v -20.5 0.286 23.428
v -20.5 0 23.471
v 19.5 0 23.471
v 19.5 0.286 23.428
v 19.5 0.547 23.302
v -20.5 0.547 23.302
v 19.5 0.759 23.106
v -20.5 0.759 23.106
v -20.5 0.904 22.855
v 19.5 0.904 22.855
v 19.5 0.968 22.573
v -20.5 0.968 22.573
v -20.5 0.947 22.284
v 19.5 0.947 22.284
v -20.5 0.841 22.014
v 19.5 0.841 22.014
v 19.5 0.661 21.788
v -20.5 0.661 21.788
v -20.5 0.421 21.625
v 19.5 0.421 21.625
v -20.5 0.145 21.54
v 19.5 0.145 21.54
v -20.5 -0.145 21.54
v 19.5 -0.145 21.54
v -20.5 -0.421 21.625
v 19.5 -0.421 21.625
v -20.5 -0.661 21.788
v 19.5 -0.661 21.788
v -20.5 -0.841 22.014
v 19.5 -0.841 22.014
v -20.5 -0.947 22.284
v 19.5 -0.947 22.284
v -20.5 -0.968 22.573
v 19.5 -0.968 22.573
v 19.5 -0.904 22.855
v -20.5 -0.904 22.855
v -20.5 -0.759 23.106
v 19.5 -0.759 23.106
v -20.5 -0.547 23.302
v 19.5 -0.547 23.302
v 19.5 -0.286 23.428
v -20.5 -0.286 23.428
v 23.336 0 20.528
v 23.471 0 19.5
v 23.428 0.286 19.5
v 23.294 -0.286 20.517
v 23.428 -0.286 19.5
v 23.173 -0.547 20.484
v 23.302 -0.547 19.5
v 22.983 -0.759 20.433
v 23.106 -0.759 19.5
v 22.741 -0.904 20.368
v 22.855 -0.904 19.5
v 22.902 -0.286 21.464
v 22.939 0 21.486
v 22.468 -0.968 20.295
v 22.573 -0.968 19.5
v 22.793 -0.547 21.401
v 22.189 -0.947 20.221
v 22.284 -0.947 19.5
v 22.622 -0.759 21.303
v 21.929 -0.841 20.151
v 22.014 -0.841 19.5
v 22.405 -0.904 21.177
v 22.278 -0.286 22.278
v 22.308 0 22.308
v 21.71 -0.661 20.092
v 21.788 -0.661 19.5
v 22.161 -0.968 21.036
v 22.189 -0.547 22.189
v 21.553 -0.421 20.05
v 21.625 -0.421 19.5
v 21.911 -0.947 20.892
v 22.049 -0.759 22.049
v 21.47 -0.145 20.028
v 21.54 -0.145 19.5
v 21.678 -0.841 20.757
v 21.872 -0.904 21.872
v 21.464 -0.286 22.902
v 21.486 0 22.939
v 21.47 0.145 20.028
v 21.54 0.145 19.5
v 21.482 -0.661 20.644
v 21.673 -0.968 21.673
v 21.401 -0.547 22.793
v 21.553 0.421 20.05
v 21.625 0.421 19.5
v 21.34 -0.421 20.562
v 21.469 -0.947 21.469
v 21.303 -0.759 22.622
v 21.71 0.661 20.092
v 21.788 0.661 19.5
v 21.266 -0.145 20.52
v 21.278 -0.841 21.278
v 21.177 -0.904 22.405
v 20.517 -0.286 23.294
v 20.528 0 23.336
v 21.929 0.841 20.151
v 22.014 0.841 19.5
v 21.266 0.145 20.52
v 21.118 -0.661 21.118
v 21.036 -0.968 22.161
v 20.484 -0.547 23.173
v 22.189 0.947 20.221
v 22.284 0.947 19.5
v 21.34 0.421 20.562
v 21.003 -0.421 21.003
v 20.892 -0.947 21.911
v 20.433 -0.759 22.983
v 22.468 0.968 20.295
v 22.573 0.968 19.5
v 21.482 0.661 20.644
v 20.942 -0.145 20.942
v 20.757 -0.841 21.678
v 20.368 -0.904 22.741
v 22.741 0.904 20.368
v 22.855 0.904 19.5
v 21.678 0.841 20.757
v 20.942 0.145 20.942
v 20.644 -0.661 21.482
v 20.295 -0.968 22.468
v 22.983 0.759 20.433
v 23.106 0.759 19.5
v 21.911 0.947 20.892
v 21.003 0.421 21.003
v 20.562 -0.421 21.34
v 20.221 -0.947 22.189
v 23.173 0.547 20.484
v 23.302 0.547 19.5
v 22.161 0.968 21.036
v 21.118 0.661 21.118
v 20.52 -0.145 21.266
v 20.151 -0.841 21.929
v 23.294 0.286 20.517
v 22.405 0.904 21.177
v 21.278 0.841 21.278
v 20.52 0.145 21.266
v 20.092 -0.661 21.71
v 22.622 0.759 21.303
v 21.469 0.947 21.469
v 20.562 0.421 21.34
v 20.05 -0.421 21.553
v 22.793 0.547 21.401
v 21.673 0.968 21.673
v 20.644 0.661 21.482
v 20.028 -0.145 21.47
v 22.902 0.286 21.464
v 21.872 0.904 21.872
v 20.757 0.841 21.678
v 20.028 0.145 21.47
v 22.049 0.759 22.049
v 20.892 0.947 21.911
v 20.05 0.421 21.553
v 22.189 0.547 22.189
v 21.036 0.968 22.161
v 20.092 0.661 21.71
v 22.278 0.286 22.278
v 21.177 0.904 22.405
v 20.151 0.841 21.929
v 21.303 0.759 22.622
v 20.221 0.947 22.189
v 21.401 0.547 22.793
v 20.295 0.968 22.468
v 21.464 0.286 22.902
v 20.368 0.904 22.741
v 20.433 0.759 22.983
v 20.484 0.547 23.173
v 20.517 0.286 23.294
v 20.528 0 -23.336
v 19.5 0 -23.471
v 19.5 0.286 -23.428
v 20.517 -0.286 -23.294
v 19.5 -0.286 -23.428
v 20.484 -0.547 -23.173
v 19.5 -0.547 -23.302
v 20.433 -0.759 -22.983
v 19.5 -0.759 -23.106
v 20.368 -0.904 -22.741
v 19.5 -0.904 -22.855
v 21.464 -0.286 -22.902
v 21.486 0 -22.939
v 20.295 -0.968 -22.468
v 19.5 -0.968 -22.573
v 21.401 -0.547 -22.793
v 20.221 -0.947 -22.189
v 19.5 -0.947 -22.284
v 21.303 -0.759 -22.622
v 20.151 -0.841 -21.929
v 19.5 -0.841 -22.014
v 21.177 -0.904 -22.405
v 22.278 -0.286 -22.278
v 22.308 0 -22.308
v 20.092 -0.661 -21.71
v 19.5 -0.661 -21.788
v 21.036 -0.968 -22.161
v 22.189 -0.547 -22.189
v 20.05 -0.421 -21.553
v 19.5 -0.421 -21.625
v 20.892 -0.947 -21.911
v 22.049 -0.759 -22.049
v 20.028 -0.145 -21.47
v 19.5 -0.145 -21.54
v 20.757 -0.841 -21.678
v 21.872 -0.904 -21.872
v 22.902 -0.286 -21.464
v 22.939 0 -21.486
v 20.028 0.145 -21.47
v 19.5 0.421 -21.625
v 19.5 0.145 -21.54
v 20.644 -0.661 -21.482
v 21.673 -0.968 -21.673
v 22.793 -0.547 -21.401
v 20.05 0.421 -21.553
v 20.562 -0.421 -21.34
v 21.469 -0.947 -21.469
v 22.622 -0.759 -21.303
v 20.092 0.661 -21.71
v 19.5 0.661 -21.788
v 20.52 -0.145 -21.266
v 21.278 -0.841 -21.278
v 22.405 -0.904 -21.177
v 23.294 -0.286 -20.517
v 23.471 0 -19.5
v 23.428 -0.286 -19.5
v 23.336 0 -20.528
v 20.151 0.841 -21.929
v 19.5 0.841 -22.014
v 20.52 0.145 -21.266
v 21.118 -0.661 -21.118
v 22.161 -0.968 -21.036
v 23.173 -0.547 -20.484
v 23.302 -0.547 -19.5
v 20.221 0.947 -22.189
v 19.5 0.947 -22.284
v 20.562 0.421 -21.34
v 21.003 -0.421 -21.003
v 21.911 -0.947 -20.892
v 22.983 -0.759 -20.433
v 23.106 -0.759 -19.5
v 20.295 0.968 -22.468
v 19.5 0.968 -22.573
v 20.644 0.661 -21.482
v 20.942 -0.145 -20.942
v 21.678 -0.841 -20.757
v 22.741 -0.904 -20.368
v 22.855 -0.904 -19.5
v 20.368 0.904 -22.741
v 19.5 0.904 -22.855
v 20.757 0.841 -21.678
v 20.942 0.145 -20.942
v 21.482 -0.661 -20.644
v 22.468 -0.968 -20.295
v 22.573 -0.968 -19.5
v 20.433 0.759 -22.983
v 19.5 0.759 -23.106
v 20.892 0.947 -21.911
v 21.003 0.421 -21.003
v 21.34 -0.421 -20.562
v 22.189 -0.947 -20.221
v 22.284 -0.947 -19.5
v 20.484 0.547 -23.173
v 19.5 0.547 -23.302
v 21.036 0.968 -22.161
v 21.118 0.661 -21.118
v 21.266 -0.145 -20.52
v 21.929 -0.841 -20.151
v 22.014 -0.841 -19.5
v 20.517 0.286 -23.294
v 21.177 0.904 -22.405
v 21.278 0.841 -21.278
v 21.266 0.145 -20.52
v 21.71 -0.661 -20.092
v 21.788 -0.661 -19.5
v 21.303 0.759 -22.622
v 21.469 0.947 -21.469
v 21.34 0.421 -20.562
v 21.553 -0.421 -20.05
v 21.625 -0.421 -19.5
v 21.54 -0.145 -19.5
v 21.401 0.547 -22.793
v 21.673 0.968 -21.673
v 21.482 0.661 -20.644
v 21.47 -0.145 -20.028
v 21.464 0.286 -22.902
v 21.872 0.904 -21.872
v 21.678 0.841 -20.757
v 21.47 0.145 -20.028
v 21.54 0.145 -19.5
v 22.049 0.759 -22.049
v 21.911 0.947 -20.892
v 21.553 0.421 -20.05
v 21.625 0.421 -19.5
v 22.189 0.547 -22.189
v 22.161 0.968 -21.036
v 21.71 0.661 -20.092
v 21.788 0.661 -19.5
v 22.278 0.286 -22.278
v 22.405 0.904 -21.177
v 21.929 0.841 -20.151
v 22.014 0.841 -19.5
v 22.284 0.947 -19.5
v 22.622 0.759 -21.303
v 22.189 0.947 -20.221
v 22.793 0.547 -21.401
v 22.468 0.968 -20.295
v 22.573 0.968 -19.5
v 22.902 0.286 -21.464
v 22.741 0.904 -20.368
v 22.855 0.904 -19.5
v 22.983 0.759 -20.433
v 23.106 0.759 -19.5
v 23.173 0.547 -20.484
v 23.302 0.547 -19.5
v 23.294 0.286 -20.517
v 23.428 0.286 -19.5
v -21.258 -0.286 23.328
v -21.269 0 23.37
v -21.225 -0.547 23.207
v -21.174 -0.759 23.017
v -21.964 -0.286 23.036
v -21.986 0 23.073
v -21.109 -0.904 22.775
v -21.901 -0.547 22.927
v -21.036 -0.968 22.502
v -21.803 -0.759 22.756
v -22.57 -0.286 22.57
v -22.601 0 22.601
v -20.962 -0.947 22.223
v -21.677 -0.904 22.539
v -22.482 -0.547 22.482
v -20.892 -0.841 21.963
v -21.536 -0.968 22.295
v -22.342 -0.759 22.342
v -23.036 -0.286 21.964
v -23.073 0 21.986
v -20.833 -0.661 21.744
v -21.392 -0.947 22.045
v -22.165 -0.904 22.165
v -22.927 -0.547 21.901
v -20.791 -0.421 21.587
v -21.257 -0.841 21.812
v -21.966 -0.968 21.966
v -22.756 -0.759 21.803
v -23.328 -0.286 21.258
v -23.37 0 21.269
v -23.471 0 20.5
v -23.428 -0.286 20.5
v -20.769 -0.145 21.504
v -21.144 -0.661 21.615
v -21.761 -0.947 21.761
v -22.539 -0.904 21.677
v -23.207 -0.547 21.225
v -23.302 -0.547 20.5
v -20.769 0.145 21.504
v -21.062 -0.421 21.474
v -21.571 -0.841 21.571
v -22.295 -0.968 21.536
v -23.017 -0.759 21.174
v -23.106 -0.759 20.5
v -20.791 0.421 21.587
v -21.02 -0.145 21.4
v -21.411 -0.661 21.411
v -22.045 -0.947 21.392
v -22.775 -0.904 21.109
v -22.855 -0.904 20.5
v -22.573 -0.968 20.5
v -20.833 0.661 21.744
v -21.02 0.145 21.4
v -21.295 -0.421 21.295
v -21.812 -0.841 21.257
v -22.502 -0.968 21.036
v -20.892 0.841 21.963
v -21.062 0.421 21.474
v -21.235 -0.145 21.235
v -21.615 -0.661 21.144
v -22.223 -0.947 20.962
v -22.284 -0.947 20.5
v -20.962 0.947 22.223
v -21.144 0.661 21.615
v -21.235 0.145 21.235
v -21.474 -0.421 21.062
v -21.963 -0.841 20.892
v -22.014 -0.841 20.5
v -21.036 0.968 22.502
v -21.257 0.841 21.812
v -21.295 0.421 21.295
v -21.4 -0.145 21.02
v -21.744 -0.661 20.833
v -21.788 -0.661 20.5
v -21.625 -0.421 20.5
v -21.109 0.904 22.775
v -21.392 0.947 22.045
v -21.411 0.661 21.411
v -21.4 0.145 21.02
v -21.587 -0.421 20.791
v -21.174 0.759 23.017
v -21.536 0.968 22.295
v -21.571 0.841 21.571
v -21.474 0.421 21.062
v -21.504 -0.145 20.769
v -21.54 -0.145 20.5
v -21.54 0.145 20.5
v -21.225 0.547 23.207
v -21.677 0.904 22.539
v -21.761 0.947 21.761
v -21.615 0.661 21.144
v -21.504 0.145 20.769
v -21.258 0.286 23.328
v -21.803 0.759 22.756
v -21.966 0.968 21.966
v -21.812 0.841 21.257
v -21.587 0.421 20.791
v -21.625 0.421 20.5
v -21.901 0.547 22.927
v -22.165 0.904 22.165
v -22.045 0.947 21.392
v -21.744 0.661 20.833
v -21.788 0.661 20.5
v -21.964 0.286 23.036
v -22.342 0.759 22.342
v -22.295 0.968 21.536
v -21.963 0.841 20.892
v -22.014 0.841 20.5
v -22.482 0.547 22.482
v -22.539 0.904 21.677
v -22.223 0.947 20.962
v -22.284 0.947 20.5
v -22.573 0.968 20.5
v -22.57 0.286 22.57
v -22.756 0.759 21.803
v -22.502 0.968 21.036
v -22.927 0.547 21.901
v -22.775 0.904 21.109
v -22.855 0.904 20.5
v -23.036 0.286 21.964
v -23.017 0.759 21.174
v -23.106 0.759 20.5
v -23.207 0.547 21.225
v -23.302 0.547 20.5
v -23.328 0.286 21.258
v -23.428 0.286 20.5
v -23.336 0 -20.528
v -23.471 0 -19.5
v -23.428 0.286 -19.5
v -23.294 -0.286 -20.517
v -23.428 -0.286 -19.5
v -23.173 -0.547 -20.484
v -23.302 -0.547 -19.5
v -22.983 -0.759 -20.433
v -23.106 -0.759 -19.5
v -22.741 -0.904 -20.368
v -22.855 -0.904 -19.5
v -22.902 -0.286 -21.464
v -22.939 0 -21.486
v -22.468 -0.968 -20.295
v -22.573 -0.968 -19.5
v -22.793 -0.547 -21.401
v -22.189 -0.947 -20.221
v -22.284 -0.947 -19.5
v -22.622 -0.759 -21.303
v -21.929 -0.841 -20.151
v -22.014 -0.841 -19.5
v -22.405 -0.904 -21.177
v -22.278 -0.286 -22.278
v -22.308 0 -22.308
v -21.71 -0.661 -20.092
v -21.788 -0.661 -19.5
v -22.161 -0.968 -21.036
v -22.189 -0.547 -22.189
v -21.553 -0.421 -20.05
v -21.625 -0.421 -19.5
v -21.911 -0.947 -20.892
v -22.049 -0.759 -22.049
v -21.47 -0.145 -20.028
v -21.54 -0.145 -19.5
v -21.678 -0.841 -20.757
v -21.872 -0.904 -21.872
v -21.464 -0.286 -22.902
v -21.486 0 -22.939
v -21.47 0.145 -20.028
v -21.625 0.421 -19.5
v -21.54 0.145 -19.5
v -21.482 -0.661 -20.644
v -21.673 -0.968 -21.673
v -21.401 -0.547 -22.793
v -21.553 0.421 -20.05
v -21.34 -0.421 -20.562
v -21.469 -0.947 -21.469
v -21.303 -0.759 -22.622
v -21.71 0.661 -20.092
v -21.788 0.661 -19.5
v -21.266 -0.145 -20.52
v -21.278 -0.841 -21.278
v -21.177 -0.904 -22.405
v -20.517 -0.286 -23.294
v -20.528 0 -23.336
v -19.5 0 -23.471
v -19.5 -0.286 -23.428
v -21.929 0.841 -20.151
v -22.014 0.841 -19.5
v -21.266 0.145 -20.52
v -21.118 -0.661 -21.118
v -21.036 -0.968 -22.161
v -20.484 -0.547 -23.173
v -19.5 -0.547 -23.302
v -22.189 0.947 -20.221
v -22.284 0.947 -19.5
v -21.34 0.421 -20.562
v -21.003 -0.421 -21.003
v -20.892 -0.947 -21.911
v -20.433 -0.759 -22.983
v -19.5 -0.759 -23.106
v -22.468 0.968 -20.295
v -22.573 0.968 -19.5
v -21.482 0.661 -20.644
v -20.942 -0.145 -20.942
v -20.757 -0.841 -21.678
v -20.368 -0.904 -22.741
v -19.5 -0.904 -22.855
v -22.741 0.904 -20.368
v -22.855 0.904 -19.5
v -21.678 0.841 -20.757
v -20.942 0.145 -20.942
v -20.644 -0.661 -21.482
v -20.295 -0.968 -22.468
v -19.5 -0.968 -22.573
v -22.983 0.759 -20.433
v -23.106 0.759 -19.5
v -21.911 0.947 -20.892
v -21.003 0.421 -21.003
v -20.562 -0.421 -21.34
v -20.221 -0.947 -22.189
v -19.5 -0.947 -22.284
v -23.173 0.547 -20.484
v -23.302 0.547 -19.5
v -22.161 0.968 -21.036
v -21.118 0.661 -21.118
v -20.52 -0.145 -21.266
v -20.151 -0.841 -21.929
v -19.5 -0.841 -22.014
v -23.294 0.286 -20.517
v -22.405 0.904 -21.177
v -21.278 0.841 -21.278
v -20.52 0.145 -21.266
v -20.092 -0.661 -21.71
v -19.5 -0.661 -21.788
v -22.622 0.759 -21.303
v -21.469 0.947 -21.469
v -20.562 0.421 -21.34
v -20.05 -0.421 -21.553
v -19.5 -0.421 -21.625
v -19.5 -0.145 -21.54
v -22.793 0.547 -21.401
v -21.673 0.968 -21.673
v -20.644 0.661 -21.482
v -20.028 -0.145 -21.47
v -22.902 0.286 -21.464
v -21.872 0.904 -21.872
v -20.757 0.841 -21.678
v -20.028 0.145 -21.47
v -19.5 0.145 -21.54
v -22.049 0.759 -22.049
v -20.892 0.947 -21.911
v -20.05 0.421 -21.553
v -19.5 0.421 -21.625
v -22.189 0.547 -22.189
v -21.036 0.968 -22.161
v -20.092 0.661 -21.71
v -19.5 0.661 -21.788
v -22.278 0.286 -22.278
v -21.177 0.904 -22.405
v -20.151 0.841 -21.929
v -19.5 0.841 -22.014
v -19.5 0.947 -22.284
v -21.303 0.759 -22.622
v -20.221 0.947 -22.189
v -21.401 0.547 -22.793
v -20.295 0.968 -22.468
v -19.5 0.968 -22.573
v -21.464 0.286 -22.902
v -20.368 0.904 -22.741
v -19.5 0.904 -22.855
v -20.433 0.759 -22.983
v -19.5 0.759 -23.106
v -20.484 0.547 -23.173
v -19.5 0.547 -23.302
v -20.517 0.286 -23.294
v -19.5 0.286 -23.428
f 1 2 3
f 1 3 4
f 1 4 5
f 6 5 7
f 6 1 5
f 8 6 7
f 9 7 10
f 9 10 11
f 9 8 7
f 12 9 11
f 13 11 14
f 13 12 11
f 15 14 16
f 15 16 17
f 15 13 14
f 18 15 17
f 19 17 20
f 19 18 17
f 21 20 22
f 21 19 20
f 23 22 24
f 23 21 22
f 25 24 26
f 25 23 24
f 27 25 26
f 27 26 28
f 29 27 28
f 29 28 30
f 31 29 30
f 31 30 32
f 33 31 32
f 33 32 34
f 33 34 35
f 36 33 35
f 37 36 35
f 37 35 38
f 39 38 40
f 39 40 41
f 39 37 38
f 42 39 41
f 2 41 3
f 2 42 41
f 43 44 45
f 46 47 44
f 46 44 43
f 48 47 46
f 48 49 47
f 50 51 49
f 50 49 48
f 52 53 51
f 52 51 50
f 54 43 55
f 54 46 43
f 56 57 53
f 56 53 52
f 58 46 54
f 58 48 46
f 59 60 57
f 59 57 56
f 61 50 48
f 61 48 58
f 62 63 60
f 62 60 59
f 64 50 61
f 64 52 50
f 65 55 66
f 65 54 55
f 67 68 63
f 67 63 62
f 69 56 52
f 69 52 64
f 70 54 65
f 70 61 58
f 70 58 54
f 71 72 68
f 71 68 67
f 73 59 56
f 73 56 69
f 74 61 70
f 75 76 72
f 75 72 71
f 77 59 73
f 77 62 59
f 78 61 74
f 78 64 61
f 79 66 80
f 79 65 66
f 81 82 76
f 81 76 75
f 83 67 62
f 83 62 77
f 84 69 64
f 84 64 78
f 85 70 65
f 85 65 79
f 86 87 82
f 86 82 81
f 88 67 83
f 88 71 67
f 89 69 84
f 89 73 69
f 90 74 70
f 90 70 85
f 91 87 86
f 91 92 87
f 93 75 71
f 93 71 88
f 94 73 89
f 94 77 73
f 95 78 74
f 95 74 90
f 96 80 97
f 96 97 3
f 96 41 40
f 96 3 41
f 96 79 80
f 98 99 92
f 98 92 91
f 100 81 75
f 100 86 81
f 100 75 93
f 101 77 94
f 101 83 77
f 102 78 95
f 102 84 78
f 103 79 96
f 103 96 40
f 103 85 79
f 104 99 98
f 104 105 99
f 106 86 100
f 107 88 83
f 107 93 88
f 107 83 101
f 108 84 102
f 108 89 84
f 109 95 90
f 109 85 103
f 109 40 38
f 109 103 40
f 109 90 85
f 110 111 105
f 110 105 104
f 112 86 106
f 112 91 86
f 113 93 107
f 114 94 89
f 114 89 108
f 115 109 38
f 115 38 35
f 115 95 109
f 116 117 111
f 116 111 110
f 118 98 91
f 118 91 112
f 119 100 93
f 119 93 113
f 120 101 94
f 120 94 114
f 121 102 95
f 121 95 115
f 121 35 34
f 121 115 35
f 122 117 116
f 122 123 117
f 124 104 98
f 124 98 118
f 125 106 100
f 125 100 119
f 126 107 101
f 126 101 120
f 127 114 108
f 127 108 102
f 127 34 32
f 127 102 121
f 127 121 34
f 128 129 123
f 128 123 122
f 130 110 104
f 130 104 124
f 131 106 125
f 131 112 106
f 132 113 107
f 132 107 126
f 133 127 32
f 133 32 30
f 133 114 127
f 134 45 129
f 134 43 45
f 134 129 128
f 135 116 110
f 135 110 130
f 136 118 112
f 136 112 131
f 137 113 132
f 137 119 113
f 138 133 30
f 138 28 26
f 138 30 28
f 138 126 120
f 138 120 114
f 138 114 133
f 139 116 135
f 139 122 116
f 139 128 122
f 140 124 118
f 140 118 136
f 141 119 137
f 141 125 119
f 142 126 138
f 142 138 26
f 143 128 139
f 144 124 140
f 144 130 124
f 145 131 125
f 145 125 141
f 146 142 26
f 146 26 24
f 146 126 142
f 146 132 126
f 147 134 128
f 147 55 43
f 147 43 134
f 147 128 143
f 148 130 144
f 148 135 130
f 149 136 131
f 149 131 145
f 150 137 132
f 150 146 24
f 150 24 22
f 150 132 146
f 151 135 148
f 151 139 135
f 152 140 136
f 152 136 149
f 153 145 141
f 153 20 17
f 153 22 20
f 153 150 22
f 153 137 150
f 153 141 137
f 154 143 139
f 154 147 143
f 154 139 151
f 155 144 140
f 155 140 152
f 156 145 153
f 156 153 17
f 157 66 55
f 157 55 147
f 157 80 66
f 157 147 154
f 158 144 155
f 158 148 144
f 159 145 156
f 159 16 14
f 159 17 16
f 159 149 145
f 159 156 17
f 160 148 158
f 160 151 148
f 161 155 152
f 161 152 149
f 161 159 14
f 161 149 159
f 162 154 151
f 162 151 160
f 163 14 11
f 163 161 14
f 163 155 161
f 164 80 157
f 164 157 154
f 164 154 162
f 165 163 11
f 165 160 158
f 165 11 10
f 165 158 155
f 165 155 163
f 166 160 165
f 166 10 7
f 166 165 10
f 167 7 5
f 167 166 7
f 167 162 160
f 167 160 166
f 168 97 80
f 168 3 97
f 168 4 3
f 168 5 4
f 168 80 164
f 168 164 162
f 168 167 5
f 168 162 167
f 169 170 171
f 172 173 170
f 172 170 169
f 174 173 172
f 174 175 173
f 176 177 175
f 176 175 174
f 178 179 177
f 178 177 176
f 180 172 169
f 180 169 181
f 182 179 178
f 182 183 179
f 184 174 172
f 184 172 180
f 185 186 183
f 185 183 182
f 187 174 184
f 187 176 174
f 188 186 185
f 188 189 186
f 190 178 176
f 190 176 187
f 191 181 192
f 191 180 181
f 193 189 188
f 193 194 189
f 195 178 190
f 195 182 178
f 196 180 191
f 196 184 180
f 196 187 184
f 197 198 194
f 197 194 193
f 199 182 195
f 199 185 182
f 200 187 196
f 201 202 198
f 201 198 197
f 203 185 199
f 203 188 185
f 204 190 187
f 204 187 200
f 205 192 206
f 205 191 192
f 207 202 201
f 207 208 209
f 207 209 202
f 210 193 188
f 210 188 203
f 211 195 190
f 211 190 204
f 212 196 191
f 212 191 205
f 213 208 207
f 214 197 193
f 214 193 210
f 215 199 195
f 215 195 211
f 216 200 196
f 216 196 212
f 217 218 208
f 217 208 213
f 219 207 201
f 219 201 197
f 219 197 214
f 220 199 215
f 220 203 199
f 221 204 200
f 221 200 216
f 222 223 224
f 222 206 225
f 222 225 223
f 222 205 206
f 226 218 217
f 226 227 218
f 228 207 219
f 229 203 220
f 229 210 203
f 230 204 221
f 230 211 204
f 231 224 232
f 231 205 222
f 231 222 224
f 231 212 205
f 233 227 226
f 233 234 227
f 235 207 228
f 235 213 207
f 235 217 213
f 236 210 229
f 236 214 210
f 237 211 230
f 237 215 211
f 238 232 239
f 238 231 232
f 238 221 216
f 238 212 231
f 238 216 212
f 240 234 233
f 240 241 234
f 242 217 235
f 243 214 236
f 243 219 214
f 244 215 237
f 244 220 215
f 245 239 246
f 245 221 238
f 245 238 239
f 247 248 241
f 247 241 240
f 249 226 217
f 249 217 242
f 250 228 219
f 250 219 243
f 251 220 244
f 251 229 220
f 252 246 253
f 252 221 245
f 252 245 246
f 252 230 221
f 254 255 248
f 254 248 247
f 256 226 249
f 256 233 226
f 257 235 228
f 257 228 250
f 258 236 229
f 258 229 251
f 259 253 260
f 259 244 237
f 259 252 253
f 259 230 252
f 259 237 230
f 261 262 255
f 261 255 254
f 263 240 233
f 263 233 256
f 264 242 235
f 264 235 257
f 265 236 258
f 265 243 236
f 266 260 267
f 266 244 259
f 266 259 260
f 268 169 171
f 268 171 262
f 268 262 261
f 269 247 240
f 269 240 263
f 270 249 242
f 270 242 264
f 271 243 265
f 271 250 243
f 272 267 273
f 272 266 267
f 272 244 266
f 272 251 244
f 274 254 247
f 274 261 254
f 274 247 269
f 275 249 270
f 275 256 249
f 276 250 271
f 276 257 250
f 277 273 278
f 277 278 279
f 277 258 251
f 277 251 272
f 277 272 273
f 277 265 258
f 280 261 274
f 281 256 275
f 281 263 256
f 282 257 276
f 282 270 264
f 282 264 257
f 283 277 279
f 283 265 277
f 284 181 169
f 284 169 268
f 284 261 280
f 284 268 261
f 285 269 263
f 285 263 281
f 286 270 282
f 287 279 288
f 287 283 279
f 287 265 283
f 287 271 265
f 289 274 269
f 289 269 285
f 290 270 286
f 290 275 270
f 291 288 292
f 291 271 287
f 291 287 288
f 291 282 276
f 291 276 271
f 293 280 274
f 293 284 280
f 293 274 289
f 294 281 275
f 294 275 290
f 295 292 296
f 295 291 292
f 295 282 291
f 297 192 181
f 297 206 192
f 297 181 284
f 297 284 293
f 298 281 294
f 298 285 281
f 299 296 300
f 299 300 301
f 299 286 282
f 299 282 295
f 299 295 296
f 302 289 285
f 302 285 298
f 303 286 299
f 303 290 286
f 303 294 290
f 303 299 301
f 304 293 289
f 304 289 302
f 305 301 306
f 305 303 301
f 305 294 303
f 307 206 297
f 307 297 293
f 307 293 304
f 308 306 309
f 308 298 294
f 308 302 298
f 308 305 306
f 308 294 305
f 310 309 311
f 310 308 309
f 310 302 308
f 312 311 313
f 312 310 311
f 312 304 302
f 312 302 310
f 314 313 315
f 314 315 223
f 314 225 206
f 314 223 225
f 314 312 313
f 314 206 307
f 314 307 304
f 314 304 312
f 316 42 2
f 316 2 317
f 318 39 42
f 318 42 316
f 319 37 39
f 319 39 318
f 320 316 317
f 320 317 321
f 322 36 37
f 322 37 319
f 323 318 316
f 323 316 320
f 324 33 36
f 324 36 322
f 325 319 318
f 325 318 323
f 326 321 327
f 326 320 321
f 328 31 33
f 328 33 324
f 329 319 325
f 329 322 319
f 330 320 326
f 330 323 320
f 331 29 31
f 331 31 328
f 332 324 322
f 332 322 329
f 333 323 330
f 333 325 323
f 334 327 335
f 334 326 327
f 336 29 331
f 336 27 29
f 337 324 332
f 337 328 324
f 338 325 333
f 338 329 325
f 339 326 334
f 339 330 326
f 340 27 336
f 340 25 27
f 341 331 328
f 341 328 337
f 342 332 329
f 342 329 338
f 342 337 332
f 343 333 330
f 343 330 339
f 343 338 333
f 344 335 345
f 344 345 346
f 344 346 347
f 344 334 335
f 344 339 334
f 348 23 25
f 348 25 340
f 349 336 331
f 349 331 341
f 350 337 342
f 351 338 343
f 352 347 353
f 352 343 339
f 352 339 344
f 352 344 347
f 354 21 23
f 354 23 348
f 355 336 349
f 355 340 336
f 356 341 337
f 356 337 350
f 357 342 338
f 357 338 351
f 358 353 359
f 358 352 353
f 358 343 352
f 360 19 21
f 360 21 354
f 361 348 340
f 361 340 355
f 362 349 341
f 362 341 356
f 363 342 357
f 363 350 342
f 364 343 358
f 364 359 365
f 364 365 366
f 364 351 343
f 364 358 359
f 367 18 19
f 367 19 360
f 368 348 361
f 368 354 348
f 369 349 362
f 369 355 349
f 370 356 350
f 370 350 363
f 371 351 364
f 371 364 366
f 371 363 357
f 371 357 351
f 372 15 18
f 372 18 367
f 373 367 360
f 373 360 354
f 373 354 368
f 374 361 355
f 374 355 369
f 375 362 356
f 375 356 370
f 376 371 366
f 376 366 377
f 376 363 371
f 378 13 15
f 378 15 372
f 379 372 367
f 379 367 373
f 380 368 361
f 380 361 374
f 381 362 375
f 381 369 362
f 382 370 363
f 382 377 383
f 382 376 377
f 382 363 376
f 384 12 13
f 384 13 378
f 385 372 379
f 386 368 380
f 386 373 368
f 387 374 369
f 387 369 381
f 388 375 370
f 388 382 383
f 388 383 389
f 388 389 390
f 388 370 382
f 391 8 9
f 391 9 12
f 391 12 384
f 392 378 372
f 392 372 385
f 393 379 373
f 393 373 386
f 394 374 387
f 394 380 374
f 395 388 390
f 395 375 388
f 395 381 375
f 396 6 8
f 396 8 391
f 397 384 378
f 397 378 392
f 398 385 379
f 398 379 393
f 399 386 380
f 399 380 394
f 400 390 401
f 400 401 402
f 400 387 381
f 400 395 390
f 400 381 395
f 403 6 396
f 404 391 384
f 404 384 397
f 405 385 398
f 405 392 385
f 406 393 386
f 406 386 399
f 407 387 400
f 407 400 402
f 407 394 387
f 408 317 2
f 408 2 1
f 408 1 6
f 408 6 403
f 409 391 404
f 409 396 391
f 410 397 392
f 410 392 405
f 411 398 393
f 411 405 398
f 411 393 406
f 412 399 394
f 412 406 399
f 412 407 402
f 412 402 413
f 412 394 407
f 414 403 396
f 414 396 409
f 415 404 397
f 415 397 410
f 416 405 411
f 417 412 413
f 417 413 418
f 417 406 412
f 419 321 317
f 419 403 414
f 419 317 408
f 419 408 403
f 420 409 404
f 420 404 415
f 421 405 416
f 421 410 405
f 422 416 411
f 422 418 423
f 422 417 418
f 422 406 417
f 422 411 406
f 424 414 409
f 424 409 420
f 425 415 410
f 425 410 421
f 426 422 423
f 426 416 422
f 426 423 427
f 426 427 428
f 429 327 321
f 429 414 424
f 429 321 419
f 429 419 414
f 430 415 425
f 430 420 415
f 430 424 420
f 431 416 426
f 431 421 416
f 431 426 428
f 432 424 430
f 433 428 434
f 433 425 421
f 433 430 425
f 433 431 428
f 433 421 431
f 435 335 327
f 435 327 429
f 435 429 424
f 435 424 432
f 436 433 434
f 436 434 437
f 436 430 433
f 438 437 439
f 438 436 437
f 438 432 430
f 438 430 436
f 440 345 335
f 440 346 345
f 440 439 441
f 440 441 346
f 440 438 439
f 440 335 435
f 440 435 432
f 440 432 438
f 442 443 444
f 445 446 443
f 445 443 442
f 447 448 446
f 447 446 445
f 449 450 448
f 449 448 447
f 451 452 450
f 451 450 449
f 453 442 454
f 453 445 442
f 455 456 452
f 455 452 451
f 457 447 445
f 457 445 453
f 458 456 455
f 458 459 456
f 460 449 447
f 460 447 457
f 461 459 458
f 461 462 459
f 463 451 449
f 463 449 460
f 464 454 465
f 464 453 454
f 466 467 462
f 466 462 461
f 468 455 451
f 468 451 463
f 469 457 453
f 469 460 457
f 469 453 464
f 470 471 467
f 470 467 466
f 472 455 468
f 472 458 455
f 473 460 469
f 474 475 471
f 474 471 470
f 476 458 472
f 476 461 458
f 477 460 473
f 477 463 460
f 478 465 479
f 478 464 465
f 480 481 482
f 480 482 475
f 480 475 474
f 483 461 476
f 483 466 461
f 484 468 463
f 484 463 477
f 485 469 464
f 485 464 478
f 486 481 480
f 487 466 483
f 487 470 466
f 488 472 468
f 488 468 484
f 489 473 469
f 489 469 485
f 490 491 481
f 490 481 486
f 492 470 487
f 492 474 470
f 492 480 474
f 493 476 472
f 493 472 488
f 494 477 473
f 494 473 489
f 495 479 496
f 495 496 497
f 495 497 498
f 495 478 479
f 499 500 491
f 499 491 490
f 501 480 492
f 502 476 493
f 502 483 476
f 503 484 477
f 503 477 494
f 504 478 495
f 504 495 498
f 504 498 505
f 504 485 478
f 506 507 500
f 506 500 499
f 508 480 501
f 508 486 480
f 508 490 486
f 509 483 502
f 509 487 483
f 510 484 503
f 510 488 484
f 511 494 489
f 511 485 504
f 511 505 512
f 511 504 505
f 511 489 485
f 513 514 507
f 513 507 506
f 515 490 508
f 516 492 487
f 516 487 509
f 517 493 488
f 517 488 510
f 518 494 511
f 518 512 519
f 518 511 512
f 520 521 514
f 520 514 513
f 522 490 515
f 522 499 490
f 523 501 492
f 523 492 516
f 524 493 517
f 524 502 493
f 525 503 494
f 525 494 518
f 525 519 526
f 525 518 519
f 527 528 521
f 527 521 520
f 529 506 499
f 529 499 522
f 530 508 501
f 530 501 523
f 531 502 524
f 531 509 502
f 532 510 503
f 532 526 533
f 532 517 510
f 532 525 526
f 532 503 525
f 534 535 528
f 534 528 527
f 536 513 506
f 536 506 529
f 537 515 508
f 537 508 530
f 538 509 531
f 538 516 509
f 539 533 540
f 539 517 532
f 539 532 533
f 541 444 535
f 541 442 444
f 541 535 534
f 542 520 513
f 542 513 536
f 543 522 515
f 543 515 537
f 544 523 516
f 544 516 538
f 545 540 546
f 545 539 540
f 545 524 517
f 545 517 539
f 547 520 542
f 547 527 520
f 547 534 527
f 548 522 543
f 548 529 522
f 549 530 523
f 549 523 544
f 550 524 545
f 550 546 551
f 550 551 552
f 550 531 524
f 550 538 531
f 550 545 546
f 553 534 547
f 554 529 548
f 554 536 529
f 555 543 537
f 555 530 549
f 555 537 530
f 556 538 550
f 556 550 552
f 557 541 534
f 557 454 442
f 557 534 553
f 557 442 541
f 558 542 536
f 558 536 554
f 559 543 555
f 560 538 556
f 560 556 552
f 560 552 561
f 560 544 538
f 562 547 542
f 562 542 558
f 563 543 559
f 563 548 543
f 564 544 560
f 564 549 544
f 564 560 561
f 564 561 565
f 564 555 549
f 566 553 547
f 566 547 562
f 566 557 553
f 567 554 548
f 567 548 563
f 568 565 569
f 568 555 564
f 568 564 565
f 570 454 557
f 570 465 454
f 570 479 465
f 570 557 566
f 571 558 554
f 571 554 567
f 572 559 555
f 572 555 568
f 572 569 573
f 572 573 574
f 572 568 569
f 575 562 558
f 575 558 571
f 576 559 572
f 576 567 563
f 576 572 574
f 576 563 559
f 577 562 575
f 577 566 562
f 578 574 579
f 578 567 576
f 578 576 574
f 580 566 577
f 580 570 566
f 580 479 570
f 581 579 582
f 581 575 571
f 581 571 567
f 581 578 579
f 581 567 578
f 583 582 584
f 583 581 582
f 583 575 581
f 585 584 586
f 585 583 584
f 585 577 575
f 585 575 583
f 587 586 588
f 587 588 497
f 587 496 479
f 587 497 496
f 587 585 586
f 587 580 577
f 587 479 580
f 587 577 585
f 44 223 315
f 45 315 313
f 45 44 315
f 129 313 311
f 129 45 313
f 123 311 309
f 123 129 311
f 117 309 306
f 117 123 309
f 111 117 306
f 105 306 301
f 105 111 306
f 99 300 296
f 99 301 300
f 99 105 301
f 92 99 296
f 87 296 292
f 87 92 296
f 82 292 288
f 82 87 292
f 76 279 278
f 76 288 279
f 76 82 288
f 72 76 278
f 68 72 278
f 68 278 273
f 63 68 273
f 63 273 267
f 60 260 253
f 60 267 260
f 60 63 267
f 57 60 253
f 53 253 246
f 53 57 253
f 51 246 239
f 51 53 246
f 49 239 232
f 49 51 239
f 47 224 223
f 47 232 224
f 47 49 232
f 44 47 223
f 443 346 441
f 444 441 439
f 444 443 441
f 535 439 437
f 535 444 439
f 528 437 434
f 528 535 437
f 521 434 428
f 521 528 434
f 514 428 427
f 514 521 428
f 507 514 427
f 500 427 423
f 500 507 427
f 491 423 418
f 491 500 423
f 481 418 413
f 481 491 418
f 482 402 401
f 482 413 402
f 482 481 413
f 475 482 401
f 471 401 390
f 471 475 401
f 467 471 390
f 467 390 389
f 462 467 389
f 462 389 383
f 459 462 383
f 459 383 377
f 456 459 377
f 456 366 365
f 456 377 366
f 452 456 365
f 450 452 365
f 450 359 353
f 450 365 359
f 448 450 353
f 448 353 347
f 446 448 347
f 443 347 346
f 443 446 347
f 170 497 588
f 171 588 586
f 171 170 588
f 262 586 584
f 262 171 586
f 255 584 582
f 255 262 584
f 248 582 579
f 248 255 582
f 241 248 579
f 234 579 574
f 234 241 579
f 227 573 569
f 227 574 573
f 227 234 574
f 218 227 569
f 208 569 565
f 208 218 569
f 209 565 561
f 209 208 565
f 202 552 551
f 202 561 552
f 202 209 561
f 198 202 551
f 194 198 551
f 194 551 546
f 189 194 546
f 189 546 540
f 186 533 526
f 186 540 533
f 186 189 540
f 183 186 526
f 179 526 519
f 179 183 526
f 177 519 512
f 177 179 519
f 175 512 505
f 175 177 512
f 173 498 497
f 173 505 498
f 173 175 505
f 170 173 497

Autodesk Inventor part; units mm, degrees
ref_plane "YZ Plane" through (0, 0, 0) normal (1, 0, 0) x (0, 1, 0)
ref_plane "XZ Plane" through (0, 0, 0) normal (0, 1, 0) x (-1, 0, 0)
ref_plane "XY Plane" through (0, 0, 0) normal (0, 0, 1) x (1, 0, 0)
sketch "Sketch1" plane through (0, 0, 0) normal (0, 1, 0) x (-1, 0, 0)
  line L0 (-19.5, 22.5) -> (20.5, 22.5)
  line L1 (22.5, 20.5) -> (22.5, -19.5)
  line L2 (19.5, -22.5) -> (-19.5, -22.5)
  line L3 (-22.5, -19.5) -> (-22.5, 19.5)
  line L4 (-22.5, 22.5) -> (22.5, -22.5) construction
  line L5 (22.5, 22.5) -> (-22.5, -22.5) construction
  arc A0 (22.5, 20.5) -> (20.5, 22.5) centre (20.5, 20.5) ccw
  arc A1 (19.5, -22.5) -> (22.5, -19.5) centre (19.5, -19.5) ccw
  arc A2 (-22.5, -19.5) -> (-19.5, -22.5) centre (-19.5, -19.5) ccw
  arc A3 (-19.5, 22.5) -> (-22.5, 19.5) centre (-19.5, 19.5) ccw
  point P0 (0, 0)
  dimension "d0" = 45
  dimension "d1" = 45
  dimension "d2" = 2
  dimension "d3" = 3
sketch "Sketch2" plane through (0, 0, 0) normal (0, 0, 1) x (1, 0, 0)
  point P0 (0, 0)
sketch "Sketch3" plane through (0, 0, 0) normal (0, 0, 1) x (1, 0, 0)
  circle A0 centre (22.5, 0) radius 0.9712
  point P0 (0, 0)
  dimension "d5" = 22.5
sweep "Sweep1" add profiles "Sketch3" path "Sketch1"
equation "\"d1\" = d0"
equation "\"d5\" = 0.5 * d1"
properties part number "rfCoilSmaller"
